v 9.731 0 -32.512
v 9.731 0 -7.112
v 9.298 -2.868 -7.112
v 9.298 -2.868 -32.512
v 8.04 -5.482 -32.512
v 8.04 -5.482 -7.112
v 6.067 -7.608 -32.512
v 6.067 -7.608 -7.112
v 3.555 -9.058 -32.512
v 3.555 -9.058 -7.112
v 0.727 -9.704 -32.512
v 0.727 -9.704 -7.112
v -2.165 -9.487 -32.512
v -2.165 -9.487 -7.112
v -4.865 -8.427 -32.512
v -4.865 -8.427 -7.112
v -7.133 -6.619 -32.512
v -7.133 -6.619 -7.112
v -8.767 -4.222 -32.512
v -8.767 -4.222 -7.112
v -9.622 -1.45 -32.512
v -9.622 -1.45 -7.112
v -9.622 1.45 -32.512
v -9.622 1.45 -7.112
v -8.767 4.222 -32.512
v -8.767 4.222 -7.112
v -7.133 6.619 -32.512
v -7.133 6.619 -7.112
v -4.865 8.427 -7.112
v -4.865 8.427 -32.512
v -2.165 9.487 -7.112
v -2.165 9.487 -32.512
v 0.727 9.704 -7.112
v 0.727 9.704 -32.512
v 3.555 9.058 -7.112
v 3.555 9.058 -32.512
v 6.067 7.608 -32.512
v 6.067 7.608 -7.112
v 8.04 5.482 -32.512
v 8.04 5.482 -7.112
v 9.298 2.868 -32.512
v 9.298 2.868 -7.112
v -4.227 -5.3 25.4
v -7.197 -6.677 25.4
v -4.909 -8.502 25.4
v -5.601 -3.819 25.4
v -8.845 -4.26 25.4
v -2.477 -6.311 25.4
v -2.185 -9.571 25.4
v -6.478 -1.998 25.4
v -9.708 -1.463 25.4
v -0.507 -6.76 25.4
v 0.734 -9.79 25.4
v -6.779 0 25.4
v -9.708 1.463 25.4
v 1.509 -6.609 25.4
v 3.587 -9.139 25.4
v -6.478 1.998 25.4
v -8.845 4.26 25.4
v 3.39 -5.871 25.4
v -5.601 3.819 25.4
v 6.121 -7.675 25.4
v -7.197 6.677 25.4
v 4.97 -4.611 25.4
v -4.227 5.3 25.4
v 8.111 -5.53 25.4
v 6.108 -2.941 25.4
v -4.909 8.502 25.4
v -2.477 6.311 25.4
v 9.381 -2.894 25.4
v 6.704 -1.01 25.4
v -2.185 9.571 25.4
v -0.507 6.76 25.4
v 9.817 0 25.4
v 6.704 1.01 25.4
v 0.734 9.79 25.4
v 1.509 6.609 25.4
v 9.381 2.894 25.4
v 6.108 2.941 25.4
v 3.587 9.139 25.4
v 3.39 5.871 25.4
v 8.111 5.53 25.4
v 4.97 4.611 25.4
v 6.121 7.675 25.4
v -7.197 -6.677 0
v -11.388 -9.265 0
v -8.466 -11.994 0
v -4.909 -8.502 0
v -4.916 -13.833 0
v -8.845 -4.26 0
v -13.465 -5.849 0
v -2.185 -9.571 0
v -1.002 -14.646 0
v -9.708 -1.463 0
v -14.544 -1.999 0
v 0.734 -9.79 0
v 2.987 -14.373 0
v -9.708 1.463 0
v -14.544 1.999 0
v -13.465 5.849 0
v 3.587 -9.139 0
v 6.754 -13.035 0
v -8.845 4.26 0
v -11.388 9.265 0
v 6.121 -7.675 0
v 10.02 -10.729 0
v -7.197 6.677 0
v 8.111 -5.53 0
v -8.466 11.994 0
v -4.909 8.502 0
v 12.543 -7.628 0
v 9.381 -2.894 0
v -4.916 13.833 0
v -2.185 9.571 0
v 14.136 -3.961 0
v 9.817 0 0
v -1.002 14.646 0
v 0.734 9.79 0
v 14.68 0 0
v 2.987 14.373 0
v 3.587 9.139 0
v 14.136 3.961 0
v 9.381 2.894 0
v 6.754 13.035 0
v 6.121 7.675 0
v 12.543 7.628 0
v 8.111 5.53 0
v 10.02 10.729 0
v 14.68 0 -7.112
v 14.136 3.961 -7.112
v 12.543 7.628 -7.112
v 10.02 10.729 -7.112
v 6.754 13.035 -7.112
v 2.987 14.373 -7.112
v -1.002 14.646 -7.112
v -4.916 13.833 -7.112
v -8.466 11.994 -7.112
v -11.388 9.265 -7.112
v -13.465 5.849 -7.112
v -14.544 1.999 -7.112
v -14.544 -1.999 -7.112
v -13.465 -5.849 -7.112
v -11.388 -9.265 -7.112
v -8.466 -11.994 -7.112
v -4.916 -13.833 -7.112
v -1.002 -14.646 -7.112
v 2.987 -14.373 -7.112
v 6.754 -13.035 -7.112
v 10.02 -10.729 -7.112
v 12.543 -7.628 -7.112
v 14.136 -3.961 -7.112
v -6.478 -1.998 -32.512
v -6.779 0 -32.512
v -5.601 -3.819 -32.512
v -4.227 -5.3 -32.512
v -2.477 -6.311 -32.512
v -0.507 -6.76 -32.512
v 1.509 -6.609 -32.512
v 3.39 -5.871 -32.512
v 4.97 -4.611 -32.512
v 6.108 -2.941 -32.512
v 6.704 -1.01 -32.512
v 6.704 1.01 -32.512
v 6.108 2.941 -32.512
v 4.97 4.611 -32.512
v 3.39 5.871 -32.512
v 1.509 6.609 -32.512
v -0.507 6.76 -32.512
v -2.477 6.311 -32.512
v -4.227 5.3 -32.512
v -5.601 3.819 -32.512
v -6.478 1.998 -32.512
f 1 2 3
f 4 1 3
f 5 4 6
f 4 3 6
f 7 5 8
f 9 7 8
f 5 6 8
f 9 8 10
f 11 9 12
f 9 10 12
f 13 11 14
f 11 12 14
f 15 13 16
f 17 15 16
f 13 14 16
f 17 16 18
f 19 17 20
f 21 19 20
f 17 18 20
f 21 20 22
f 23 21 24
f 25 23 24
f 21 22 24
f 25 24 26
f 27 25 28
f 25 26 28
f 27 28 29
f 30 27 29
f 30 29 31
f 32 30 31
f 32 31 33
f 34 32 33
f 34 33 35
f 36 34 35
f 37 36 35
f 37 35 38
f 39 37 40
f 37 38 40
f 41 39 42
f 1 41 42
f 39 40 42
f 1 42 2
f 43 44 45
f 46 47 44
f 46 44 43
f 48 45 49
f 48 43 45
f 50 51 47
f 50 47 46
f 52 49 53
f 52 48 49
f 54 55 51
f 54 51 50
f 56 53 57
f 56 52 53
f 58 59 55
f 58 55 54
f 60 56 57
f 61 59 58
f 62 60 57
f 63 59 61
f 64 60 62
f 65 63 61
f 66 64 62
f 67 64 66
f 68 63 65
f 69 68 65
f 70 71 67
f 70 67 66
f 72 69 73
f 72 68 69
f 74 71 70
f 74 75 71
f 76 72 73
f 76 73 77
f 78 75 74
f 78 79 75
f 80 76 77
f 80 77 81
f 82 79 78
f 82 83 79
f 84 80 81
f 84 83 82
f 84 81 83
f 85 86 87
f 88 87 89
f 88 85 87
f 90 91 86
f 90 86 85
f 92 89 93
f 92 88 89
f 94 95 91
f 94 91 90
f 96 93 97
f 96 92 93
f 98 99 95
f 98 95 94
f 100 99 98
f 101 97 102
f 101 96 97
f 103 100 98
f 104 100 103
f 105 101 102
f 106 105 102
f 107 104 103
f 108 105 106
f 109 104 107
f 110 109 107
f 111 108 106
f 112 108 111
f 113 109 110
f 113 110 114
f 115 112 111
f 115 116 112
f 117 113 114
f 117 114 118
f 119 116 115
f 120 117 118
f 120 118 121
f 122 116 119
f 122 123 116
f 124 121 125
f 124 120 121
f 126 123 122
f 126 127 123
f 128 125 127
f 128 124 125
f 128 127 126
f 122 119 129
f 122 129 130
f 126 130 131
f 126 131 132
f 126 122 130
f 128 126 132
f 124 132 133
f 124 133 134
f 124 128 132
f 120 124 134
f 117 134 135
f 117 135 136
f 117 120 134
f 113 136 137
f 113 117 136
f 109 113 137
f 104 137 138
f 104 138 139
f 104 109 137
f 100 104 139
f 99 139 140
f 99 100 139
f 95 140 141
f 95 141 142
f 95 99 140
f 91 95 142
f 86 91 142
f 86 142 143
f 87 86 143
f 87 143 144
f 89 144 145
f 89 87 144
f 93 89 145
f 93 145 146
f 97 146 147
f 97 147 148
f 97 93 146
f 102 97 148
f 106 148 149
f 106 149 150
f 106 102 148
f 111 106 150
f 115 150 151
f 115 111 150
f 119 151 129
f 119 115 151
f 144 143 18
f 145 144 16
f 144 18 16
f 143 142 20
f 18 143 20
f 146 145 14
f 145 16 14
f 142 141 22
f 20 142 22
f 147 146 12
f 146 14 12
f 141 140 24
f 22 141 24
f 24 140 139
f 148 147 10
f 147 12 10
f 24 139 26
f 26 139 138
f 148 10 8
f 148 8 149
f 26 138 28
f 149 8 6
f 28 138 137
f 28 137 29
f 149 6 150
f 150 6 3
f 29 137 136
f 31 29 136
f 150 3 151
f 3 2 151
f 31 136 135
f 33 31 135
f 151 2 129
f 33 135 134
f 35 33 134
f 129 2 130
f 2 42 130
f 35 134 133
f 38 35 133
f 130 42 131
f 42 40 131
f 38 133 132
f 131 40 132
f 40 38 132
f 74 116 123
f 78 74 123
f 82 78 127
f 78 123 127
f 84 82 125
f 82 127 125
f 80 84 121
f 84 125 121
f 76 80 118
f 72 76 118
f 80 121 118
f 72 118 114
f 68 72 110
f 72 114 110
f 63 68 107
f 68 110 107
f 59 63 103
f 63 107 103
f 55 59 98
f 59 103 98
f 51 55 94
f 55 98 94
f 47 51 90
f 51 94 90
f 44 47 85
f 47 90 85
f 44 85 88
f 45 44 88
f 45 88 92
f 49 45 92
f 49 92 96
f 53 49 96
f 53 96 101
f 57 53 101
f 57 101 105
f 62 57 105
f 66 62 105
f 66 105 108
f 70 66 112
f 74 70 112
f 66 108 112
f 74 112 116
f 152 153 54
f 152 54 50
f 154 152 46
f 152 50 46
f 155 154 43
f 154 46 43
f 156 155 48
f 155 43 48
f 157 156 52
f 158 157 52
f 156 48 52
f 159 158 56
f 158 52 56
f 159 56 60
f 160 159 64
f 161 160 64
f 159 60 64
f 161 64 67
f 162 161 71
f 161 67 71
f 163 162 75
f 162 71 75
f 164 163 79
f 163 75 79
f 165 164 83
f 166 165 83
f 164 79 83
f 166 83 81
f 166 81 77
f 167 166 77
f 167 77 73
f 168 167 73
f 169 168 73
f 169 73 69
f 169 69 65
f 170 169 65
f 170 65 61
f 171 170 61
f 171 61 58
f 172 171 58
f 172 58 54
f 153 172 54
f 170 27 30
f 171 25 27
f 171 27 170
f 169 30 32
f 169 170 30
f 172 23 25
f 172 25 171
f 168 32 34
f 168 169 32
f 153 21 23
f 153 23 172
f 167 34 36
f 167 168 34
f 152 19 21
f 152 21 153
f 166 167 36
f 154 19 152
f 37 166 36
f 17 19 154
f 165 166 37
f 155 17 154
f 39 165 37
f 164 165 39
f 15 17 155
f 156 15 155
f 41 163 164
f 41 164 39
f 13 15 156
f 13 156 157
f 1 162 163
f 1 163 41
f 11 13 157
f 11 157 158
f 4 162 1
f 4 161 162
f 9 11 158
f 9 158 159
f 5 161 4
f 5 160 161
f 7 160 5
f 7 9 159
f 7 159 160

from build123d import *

# Parameters (mm, degrees)
F0_R      = 9.817303
F1_DEPTH  = 25.4
F3_R      = 6.778938
F4_DEPTH  = 25.4
F5_R      = 14.680473
F6_DEPTH  = 7.112
F7_R      = 9.730781
F8_DEPTH  = 25.4
F9_R      = 6.676703
F10_DEPTH = 92.456
F11_D     = 13.55852


with BuildPart() as f1:
    # F0 (on Top) → F1 (new body)
    with BuildSketch(Plane.XY):
        Circle(F0_R)
    extrude(amount=F1_DEPTH)

    # F3 (on face) → F4 (cut)
    with BuildSketch(Plane.XY.offset(25.4)):
        Circle(F3_R)
    extrude(amount=-F4_DEPTH, mode=Mode.SUBTRACT)

    # F5 (on Top) → F6 (join)
    with BuildSketch(Plane.XY):
        Circle(F5_R)
    extrude(amount=-F6_DEPTH)

    # F7 (on face) → F8 (join)
    with BuildSketch(Plane(origin=(0, 0, -7.112), x_dir=(1, 0, 0), z_dir=(0, 0, -1))):
        Circle(F7_R)
    extrude(amount=F8_DEPTH)

    # F9 (on face) → F10 (join)
    with BuildSketch(Plane(origin=(0, 0, -32.512), x_dir=(1, 0, 0), z_dir=(0, 0, -1))):
        Circle(F9_R)
    extrude(amount=-F10_DEPTH)

    # F11 (through all)
    with Locations(Plane(origin=(0, 0, -32.512), x_dir=(1, 0, 0), z_dir=(0, 0, -1))):
        with Locations((0, 0)):
            Hole(F11_D / 2)


solid = f1.part
